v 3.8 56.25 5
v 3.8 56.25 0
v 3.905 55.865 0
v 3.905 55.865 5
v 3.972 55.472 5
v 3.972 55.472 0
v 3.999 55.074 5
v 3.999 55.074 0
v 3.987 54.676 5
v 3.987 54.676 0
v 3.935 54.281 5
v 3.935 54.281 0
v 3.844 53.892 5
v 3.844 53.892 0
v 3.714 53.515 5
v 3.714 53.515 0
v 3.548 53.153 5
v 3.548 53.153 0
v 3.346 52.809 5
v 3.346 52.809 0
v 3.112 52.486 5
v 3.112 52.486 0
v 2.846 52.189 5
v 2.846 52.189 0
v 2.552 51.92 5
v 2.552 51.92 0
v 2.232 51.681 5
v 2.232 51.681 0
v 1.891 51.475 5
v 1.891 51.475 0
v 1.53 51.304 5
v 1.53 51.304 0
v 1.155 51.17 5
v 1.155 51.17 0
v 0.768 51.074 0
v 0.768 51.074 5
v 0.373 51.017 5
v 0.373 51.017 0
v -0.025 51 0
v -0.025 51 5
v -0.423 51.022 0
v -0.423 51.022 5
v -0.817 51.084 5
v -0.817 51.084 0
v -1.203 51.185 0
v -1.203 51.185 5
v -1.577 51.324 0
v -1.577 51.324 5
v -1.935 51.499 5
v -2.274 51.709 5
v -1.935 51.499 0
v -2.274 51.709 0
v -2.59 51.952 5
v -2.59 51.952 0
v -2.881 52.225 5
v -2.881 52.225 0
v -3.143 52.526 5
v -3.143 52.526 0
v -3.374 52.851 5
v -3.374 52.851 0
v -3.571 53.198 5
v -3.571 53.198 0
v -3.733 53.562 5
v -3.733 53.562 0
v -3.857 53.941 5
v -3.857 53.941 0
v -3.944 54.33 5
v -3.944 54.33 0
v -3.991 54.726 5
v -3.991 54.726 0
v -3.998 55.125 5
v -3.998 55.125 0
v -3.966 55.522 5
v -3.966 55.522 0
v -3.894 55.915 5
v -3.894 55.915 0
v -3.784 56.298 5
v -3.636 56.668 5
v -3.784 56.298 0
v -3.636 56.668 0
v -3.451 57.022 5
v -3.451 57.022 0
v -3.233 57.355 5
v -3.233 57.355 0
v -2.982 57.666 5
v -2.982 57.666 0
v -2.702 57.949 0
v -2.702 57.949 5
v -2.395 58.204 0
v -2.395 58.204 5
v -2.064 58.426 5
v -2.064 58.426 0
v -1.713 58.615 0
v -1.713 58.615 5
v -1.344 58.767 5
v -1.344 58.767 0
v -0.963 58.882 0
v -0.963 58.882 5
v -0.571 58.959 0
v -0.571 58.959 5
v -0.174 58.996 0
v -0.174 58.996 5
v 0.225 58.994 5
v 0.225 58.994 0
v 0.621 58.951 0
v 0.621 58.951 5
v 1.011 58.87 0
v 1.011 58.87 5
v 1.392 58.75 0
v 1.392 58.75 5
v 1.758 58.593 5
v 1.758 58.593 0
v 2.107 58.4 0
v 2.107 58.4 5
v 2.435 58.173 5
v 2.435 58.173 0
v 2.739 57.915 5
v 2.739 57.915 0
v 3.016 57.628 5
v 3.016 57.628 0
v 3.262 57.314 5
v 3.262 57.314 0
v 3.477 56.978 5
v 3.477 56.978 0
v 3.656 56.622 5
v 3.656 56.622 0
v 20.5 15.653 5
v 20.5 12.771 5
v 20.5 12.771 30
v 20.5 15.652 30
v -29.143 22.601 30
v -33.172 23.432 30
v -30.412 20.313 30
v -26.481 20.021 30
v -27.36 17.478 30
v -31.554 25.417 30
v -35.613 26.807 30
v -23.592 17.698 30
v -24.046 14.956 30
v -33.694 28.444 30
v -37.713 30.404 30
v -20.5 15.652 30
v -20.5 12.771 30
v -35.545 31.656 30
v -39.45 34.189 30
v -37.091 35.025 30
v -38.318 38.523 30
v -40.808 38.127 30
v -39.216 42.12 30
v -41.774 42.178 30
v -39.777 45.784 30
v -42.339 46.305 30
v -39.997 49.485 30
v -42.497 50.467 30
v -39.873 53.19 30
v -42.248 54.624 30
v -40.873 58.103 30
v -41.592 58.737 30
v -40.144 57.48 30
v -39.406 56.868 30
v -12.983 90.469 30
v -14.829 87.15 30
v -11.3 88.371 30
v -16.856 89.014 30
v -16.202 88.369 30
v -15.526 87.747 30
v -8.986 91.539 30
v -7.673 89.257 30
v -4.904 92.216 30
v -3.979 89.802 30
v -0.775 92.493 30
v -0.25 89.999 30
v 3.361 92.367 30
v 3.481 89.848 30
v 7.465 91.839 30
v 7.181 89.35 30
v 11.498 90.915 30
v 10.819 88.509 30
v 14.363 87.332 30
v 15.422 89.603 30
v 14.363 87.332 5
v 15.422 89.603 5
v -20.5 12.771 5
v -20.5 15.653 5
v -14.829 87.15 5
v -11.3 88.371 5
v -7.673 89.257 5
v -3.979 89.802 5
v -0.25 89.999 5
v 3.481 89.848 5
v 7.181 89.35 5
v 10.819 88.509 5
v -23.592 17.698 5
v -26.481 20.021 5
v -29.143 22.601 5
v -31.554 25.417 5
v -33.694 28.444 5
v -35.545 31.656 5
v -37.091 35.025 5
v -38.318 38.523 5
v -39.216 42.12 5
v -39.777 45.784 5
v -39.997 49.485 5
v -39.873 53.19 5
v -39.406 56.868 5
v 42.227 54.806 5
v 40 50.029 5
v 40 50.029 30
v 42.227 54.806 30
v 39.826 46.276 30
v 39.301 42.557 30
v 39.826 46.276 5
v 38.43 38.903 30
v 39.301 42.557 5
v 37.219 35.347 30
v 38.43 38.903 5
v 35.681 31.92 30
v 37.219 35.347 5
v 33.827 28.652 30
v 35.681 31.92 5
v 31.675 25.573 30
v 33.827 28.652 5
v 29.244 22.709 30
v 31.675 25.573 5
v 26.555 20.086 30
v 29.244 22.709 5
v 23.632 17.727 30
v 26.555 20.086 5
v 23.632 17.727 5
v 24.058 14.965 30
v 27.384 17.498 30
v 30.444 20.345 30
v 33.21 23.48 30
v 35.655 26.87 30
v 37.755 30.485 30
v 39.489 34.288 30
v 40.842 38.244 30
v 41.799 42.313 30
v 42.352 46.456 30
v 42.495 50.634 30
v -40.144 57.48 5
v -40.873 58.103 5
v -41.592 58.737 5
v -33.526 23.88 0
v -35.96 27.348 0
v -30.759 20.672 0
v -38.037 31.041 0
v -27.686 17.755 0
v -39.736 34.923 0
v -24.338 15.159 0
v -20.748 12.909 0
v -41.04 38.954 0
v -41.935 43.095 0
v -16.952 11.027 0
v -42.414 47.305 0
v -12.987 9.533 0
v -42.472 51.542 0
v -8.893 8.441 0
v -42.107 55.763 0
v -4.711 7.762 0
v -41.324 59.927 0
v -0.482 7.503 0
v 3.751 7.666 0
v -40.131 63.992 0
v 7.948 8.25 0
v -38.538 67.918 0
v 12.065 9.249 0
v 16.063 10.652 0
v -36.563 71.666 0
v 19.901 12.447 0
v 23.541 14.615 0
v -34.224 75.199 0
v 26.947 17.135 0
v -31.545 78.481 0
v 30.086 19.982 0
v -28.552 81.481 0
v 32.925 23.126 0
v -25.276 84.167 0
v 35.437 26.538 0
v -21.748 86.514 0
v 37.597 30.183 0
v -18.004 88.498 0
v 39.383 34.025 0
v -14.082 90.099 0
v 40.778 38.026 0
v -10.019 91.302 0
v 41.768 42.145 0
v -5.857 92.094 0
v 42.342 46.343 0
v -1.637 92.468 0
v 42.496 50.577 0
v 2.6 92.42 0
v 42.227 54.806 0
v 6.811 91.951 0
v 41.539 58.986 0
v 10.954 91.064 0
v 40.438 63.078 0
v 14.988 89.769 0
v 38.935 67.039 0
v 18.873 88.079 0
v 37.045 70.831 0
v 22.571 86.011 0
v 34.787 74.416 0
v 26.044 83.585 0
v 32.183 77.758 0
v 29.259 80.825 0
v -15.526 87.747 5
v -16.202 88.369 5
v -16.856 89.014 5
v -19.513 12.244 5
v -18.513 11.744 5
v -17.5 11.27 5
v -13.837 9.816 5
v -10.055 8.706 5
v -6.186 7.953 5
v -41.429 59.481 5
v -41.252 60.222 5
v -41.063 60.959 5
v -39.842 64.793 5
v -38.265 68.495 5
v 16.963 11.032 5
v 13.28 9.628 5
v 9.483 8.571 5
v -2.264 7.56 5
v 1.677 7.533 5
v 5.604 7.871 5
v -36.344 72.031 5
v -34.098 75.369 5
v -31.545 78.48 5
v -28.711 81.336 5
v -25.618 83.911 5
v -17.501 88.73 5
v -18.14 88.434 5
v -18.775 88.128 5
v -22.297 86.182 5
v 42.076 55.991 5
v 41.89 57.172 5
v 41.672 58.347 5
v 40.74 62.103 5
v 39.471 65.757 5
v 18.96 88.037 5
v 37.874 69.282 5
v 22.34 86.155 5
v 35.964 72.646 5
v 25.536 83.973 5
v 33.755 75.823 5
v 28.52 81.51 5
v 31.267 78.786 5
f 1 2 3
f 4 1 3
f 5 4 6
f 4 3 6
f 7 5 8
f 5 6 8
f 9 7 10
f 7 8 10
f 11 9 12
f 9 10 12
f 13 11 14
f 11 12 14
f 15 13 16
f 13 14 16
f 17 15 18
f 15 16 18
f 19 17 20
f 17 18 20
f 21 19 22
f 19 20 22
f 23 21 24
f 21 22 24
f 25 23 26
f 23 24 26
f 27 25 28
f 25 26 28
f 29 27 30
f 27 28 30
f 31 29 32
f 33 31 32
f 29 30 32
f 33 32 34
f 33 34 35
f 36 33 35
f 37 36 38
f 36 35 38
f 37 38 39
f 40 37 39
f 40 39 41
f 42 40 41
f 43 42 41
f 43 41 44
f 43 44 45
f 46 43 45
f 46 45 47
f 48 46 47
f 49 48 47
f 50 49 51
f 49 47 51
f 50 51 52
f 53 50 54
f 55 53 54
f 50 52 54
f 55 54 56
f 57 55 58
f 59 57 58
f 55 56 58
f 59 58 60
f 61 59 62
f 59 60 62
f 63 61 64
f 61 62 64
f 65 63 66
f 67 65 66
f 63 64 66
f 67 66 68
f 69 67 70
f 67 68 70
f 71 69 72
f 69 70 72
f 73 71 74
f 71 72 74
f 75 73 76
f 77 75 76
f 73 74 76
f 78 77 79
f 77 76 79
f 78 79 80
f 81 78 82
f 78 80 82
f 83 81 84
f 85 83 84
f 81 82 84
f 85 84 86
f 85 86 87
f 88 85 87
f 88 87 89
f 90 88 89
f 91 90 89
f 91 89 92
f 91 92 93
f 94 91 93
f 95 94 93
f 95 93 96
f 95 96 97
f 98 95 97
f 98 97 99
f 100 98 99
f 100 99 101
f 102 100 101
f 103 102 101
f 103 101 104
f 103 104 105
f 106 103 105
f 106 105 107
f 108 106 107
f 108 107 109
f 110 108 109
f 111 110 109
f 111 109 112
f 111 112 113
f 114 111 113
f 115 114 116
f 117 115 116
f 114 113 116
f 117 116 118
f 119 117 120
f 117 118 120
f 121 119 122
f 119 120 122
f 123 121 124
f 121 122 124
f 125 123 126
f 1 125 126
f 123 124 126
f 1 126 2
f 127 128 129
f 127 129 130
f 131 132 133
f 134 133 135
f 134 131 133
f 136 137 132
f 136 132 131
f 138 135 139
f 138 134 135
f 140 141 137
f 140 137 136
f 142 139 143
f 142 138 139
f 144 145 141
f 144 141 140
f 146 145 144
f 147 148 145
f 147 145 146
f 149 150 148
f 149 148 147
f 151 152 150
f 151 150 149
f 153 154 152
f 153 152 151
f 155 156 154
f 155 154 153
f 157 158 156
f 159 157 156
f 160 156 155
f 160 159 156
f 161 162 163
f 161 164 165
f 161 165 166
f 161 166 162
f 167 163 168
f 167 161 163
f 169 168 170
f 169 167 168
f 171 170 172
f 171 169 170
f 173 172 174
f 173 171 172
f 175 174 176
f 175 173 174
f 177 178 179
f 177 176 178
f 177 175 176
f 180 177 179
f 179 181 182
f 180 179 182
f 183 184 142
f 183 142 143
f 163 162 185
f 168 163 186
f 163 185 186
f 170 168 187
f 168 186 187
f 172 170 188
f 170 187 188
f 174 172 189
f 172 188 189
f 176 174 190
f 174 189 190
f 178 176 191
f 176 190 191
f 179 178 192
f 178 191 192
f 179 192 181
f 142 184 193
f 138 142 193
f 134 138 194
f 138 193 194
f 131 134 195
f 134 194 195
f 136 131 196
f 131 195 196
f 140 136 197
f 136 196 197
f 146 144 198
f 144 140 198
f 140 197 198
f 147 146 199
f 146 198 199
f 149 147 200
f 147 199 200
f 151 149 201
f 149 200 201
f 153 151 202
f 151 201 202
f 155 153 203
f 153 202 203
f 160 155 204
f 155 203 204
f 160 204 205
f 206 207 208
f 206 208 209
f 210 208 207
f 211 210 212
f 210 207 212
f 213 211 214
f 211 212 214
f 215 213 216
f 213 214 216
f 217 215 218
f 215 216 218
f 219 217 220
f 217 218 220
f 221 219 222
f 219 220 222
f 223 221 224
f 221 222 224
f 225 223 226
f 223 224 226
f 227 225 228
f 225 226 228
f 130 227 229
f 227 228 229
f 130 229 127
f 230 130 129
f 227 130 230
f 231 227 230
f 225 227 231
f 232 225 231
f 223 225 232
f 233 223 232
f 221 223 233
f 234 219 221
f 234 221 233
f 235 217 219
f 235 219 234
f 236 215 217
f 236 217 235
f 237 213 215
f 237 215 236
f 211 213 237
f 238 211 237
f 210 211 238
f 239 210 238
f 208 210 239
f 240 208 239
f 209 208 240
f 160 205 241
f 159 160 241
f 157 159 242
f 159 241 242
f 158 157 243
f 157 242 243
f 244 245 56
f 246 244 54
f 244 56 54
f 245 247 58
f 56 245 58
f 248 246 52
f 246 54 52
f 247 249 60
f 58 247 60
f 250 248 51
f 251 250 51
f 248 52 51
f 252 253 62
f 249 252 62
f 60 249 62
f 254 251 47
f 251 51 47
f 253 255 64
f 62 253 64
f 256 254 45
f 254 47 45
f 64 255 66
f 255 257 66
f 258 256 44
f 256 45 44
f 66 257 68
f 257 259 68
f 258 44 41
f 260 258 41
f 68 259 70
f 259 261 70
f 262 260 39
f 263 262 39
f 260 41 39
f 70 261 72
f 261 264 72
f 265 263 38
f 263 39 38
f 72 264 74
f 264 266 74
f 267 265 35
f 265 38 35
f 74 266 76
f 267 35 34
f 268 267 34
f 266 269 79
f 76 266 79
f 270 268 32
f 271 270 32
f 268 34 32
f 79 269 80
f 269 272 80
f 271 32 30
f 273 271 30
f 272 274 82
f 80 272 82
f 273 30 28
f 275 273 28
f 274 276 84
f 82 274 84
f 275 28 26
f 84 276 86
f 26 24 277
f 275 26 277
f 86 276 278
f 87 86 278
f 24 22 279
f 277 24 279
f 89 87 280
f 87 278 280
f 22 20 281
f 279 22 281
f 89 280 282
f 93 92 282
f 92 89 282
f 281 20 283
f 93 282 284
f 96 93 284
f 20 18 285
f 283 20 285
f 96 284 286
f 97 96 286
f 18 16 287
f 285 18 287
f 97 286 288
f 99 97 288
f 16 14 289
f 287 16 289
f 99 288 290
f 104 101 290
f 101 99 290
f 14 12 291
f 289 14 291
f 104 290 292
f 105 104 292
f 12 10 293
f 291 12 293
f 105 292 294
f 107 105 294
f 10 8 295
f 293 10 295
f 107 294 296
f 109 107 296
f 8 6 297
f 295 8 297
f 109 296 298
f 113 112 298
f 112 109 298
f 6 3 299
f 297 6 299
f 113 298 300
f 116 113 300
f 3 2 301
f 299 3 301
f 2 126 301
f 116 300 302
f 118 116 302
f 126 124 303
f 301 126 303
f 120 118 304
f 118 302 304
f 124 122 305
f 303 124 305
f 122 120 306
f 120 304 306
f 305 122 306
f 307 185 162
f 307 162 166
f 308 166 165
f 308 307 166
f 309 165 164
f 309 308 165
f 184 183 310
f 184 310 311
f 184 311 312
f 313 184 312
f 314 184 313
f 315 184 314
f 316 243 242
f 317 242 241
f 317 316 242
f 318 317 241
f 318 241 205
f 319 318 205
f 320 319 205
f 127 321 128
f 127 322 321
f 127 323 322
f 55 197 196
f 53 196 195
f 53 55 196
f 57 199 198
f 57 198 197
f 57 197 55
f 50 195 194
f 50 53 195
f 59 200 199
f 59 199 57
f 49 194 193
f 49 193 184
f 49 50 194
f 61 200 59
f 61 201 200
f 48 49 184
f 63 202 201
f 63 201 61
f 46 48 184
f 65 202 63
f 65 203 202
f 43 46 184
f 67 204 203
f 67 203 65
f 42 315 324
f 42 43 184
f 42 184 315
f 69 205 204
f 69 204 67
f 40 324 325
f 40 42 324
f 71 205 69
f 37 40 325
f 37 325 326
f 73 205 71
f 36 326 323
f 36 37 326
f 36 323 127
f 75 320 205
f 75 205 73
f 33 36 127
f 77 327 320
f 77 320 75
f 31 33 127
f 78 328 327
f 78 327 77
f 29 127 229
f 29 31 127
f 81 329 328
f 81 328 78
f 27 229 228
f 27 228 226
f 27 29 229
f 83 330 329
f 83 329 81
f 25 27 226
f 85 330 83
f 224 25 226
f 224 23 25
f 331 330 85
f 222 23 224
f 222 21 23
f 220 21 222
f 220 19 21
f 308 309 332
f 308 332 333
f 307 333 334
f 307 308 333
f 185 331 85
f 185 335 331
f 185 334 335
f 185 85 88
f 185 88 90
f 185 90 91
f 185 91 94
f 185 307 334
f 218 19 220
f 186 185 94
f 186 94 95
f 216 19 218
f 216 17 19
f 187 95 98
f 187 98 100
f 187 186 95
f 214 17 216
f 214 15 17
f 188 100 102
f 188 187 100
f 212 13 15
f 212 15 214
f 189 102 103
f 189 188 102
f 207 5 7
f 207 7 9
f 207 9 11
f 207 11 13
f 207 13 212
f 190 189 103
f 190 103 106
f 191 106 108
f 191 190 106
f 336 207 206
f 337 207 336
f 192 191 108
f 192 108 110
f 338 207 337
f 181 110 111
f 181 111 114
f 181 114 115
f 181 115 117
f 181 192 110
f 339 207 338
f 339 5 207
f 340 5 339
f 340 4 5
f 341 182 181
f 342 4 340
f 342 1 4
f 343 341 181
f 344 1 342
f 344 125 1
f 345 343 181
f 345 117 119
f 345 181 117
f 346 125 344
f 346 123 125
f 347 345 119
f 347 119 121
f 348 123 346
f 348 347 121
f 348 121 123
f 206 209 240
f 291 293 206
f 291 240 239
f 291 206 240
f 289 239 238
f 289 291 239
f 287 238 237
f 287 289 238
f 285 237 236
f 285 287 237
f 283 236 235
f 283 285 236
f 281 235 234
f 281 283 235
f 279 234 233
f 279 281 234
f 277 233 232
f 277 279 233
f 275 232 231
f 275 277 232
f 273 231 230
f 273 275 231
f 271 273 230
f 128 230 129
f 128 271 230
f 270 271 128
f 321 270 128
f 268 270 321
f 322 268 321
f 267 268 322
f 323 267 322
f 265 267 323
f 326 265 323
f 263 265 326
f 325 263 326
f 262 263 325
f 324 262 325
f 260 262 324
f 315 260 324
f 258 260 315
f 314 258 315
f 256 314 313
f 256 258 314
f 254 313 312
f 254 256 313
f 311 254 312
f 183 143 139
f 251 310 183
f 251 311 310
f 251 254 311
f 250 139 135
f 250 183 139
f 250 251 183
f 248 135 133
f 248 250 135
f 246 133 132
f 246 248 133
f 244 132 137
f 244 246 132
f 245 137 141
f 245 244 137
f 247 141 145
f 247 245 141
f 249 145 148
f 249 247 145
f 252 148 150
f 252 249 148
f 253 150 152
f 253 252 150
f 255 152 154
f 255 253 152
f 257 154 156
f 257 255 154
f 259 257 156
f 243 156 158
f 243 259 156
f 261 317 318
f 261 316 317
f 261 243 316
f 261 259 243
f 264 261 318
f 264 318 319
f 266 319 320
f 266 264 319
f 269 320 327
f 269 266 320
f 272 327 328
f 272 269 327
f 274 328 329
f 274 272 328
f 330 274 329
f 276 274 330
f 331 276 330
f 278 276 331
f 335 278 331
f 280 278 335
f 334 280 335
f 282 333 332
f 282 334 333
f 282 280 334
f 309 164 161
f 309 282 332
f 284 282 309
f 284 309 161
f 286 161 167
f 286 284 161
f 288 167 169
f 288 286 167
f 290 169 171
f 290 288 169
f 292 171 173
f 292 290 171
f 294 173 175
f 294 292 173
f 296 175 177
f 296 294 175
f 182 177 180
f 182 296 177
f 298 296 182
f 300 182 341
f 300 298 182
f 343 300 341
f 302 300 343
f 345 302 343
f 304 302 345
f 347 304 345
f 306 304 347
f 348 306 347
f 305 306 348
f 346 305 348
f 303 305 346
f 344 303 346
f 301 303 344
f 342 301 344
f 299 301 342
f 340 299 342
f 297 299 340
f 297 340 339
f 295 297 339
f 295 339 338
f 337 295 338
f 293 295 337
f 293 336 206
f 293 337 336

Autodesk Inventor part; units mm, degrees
ref_plane "YZ Plane" through (0, 0, 0) normal (1, 0, 0) x (0, 1, 0)
ref_plane "XZ Plane" through (0, 0, 0) normal (0, 1, 0) x (-1, 0, 0)
ref_plane "XY Plane" through (0, 0, 0) normal (0, 0, 1) x (1, 0, 0)
sketch "Sketch1" plane through (0, 0, 0) normal (0, 0, 1) x (1, 0, 0)
  line L0 (17.5, 11.2702) -> (17.5, 14.0313)
  line L1 (-17.5, 14.0313) -> (-17.5, 11.2702)
  line L2 (20.5, 12.771) -> (20.5, 15.6525)
  line L3 (-20.5, 15.6525) -> (-20.5, 12.771)
  arc A0 (17.5, 14.0313) -> (-17.5, 14.0313) centre (0, 50) ccw
  line L4 (40, 50.029) -> (42.2274, 54.8057)
  line L5 (39.7713, 54.271) -> (41.6722, 58.3474)
  circle A1 centre (0, 50) radius 42.5
  arc A2 (-41.0627, 60.9592) -> (-38.9529, 59.0922) centre (1.7976, 107.2672) ccw
  arc A3 (-18.7749, 88.1281) -> (-16.8719, 86.2676) centre (1.7976, 107.2672) ccw
  arc A4 (-16.8563, 89.0143) -> (-14.8286, 87.1499) centre (1.7976, 107.2672) ccw
  line L6 (16.2129, 86.5669) -> (17.2697, 88.8331)
  line L7 (14.3631, 87.3323) -> (15.422, 89.6032)
  arc A5 (-41.5922, 58.7372) -> (-39.406, 56.8678) centre (1.7976, 107.2672) ccw
  circle A6 centre (0, 55) radius 4
  line L8 (-6, 53.75) -> (6, 53.75)
  line L9 (6, 53.75) -> (6, 56.25)
  line L10 (6, 56.25) -> (-6, 56.25)
  line L11 (-6, 56.25) -> (-6, 53.75)
  point P0 (0, 0)
  point P1 (20.5, 12.771)
  point P2 (42.2274, 54.8057)
  point P3 (-17.5, 11.2702)
  point P4 (17.5, 11.2702)
  point P5 (41.6722, 58.3474)
  point P6 (15.422, 89.6032)
  point P7 (17.2697, 88.8331)
  point P8 (-18.7749, 88.1281)
  point P9 (-16.8563, 89.0143)
  point P10 (-41.0627, 60.9592)
  point P11 (-3.7997, 53.75)
  point P12 (3.7997, 53.75)
  point P13 (3.7997, 56.25)
  point P14 (-3.7997, 56.25)
  point P15 (0, 44.1942)
  dimension "d87" = 40
  dimension "d167" = 85
  dimension "d168" = 2.5
  dimension "d33" = 2
  dimension "d79" = 3
  dimension "d80" = 3
  dimension "d81" = 35
  dimension "d92" = 2
  dimension "d93" = 35
  dimension "d94" = 50
  dimension "d95" = 17.5
  dimension "d146" = 8
  dimension "d147" = 12
  dimension "d148" = 2.5
  dimension "d153" = 55
  dimension "d154" = 1.25
  dimension "d169" = 35
extrude "Extrusion12" add sketch "Sketch1" along normal blind 5 contours A1 L1 A0 L0 | L0 A0 L2 A1 | A1 L3 A0 L1 | L2 A0 L4 A1 | A1 A5 A0 L3 | A0 L5 A1 L4 | A1 A2 A0 A5 | A0 L6 A1 L5 | A1 A3 A0 A2 | A0 L7 A1 L6 | A1 A4 A0 A3 | A0 A4 A1 L7 | A6 L8 L10 | A6 L10 L9 L8 | L10 A6 | A6 L8 | A6 L8 L11 L10
extrude "Extrusion13" add sketch "Sketch1" along normal blind 5 contours A1 L1 A0 L0 | A6 L8 L10 | A6 L10 L9 L8 | L10 A6 | A6 L8 | A6 L8 L11 L10
extrude "Extrusion14" cut sketch "Sketch1" along normal blind 17 contours A6 L8 L10 | A6 L10 L9 L8 | L10 A6 | A6 L8 | A6 L8 L11 L10
extrude "Extrusion15" add sketch "Sketch1" along normal blind 5 contours A6 L10 L9 L8 | A6 L8 L11 L10
extrude "Extrusion16" add sketch "Sketch1" along normal blind 30 contours L2 A0 L4 A1 | A1 A5 A0 L3 | A0 L7 A1 L6 | A0 A4 A1 L7
extrude "Extrusion17" add sketch "Sketch1" along normal blind 30 contours L0 A0 L2 A1 | A1 L3 A0 L1 | A0 L5 A1 L4 | A1 A2 A0 A5 | A1 A4 A0 A3
extrude "Extrusion18" cut sketch "Sketch1" along normal blind 30 contours L0 A0 L2 A1 | A1 L3 A0 L1 | A0 L5 A1 L4 | A1 A2 A0 A5 | A0 L7 A1 L6 | A1 A4 A0 A3
extrude "Extrusion19" add sketch "Sketch1" along normal blind 5 contours L0 A0 L2 A1 | A1 L3 A0 L1 | A0 L5 A1 L4 | A1 A2 A0 A5 | A0 L7 A1 L6 | A1 A4 A0 A3
